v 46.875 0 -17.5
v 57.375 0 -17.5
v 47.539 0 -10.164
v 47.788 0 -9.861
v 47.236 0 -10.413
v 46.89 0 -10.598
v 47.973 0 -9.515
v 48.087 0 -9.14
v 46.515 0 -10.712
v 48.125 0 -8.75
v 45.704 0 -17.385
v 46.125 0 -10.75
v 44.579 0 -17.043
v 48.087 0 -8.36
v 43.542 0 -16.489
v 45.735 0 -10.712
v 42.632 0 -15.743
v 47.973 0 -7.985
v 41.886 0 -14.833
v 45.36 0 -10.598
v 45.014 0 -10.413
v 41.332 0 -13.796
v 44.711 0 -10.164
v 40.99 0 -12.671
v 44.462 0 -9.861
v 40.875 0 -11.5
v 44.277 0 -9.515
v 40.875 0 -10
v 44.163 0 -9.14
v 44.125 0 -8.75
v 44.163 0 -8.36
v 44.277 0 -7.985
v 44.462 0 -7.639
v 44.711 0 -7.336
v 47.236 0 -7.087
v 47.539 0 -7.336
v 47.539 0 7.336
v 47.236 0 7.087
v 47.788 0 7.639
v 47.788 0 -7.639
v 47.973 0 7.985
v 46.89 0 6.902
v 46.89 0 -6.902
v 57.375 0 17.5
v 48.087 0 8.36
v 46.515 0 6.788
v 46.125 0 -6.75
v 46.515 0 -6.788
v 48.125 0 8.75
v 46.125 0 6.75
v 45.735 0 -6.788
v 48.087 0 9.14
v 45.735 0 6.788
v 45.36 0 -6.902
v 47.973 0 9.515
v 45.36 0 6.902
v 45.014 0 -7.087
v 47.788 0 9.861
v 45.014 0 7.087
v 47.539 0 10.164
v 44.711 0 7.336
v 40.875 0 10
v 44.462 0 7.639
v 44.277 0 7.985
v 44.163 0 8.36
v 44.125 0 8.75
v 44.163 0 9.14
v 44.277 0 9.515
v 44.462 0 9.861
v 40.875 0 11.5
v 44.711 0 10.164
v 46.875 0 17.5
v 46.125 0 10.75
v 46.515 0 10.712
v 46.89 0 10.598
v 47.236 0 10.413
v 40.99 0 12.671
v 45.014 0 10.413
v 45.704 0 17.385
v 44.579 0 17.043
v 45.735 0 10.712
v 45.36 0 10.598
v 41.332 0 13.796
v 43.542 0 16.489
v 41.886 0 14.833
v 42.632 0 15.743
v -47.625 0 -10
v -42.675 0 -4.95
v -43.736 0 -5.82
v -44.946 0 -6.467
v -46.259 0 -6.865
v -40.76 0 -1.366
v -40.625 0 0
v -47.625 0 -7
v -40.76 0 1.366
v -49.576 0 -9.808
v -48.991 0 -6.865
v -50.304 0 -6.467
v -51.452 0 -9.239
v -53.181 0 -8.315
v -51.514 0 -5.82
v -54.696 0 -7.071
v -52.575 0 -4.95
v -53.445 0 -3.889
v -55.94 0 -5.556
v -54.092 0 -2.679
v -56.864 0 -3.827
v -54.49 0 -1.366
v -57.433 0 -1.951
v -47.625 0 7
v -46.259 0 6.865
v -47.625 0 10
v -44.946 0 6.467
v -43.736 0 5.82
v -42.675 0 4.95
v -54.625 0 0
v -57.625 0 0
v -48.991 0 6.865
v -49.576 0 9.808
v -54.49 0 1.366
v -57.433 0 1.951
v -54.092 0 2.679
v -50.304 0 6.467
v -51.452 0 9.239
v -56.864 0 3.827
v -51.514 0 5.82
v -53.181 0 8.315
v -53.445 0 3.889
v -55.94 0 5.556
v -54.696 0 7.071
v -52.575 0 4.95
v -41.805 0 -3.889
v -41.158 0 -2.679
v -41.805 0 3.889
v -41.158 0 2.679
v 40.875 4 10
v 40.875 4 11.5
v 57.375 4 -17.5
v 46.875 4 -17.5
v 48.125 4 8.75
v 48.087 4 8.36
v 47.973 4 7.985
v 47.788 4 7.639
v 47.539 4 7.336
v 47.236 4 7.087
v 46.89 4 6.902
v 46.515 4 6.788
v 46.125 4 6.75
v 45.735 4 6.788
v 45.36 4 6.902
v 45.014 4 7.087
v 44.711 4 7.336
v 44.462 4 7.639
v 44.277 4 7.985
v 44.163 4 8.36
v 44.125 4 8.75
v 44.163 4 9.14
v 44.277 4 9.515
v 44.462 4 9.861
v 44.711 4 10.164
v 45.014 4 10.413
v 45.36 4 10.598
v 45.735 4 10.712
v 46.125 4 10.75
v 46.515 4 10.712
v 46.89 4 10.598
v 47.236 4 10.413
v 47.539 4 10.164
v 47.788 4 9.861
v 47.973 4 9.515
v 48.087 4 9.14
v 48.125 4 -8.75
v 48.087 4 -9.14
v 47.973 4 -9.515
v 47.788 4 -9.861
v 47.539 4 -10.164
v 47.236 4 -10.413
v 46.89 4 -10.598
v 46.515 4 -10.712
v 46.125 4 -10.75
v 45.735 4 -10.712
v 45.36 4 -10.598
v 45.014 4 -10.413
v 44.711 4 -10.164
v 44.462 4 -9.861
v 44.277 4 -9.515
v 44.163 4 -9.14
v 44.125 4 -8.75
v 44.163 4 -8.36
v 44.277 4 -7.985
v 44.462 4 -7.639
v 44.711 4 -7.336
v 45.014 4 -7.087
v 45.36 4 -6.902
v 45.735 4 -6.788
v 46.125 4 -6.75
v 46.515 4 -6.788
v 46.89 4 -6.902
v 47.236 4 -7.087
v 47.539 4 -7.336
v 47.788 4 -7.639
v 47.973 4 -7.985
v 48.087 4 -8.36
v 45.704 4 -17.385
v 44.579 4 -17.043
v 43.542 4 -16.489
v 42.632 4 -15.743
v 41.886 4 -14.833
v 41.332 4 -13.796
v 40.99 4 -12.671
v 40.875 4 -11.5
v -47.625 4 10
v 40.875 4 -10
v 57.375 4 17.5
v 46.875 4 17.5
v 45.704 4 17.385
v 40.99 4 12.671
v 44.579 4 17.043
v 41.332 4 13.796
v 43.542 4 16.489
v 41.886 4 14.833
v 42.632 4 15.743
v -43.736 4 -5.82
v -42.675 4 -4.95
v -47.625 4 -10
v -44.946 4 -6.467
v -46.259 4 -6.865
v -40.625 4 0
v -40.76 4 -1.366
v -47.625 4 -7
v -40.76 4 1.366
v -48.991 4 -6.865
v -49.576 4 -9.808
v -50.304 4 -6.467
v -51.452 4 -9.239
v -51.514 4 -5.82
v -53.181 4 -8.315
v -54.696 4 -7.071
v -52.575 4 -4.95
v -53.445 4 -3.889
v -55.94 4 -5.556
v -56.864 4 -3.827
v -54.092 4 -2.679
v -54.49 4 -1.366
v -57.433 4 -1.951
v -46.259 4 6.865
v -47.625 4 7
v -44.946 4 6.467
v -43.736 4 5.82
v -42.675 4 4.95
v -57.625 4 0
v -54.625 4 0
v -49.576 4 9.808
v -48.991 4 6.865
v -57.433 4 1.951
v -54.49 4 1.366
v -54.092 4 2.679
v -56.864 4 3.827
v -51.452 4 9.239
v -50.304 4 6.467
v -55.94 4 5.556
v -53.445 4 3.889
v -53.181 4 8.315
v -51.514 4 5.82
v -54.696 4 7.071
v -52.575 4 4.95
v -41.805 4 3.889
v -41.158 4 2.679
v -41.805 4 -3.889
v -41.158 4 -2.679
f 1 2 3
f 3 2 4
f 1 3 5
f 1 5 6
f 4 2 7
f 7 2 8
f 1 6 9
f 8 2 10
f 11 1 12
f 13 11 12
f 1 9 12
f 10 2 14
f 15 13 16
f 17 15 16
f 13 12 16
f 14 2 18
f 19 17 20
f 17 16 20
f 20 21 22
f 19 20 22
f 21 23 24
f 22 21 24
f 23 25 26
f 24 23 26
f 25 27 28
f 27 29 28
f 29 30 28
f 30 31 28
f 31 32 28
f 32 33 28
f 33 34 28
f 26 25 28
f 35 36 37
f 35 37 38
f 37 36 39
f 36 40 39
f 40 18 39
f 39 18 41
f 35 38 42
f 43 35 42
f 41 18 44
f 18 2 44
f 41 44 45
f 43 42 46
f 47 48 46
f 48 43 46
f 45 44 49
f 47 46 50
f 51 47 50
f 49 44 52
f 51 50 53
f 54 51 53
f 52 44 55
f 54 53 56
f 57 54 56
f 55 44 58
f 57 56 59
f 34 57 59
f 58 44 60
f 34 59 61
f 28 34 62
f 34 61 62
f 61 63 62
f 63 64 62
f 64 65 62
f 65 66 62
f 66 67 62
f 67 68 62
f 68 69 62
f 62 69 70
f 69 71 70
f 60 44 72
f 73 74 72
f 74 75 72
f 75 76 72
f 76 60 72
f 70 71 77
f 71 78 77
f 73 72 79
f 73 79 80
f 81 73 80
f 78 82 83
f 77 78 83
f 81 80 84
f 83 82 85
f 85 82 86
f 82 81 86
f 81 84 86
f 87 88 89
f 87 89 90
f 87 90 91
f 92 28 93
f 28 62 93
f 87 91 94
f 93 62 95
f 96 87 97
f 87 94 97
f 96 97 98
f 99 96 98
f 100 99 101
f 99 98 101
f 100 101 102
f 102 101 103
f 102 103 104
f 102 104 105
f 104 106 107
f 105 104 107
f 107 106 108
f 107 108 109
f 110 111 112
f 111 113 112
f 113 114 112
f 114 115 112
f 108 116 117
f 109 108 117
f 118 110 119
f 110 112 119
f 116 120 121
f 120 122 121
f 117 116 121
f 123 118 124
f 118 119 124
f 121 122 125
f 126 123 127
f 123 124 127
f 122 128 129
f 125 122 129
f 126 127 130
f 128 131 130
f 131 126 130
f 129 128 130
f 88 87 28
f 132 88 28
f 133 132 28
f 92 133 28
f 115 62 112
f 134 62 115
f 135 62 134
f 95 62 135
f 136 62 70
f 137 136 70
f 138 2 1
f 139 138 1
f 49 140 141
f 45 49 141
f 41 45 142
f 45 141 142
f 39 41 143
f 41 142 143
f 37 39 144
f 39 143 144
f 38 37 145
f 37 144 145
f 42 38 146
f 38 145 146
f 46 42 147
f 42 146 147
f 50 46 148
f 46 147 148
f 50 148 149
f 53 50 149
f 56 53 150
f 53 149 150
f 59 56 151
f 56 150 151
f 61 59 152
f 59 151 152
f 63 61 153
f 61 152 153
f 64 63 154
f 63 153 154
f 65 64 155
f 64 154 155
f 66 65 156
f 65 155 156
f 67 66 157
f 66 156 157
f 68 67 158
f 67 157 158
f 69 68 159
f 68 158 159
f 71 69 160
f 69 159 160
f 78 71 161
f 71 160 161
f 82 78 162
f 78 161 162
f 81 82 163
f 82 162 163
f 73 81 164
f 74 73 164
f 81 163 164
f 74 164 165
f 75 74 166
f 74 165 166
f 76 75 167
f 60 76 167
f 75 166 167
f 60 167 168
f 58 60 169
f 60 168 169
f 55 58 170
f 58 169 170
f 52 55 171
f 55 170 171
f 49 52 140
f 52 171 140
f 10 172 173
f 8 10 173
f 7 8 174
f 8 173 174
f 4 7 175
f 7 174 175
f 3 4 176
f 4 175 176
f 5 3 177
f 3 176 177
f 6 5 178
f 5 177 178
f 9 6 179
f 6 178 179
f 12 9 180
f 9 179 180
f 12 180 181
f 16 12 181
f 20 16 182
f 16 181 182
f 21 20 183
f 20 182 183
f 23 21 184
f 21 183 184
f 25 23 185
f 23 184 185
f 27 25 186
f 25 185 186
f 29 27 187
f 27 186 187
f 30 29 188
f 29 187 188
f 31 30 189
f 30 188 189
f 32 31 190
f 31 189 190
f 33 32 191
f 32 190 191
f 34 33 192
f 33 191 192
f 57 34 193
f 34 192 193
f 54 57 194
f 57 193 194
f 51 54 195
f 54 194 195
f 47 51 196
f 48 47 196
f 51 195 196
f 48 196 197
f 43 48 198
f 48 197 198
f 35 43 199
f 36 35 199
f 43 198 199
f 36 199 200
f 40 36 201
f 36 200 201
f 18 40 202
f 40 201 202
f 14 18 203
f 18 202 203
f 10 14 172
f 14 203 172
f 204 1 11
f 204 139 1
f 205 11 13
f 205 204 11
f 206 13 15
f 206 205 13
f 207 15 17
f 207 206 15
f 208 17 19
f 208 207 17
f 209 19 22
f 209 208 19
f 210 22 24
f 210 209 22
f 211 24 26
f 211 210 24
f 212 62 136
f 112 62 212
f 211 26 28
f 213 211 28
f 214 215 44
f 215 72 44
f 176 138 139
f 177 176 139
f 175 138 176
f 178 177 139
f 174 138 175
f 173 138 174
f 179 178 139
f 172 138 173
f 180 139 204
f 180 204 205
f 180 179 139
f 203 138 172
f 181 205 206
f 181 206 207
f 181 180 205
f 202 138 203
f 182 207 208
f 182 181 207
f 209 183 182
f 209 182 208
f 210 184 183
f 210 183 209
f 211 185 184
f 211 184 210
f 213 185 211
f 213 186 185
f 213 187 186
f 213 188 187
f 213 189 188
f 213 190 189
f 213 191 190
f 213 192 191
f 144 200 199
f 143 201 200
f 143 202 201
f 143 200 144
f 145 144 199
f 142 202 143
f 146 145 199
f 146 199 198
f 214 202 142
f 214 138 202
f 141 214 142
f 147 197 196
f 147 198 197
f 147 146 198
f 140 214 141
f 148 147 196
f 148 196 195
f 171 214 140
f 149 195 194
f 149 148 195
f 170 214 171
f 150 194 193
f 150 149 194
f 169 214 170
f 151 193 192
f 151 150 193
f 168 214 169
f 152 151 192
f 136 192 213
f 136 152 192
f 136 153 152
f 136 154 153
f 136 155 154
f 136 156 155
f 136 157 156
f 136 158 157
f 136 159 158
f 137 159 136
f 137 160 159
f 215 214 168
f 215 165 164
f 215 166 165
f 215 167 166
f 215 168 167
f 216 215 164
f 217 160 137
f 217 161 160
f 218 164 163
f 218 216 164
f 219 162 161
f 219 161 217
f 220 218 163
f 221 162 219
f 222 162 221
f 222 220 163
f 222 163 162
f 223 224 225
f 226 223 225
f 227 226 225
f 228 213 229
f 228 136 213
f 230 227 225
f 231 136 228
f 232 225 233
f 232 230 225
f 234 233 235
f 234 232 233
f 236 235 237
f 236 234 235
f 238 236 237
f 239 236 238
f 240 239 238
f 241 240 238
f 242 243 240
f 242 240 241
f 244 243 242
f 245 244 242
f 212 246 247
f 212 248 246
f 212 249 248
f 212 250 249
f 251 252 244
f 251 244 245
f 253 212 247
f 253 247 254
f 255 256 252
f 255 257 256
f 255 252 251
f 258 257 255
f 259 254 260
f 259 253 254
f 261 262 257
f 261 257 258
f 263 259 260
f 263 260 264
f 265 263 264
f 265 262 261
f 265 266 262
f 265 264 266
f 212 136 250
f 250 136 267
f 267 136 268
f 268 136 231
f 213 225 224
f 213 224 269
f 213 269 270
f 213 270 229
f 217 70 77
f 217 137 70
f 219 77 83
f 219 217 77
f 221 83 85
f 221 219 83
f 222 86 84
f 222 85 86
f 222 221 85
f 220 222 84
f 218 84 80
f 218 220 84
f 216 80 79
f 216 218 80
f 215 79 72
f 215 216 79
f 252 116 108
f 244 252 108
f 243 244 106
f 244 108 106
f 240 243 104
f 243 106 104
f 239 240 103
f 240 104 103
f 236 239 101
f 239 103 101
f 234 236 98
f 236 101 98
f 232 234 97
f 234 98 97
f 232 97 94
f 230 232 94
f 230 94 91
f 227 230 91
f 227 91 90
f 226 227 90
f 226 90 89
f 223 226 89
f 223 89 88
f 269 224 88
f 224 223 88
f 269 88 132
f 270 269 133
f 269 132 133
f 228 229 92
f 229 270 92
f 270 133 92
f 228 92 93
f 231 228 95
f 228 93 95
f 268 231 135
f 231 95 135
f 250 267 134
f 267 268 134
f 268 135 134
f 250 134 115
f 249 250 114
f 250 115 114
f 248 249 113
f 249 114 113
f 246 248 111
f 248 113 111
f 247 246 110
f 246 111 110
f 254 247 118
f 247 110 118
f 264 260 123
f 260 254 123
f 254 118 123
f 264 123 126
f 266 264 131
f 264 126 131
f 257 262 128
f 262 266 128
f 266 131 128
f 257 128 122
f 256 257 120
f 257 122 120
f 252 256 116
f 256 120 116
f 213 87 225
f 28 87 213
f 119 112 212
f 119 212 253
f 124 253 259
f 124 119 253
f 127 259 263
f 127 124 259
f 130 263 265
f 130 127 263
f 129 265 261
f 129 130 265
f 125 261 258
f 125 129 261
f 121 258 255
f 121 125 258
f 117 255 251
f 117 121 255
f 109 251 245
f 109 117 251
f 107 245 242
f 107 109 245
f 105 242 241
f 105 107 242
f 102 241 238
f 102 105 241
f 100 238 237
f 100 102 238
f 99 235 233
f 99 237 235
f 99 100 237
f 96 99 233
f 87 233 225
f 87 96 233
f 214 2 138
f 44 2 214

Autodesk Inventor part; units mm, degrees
ref_plane "YZ Plane" through (0, 0, 0) normal (1, 0, 0) x (0, 1, 0)
ref_plane "XZ Plane" through (0, 0, 0) normal (0, 1, 0) x (-1, 0, 0)
ref_plane "XY Plane" through (0, 0, 0) normal (0, 0, 1) x (1, 0, 0)
sketch "Main Sketch" plane through (0, 0, 0) normal (0, 1, 0) x (-1, 0, 0)
  line L0 (-57.375, -12.0472) -> (-57.375, 12.0472)
  line L1 (-57.375, 12.0472) -> (47.625, -10) construction
  line L2 (47.625, 10) -> (-57.375, -12.0472) construction
  circle A0 centre (47.625, 0) radius 7
  arc A1 (47.625, -10) -> (47.625, 10) centre (47.625, 0) ccw
  line L3 (-40.875, 17.5) -> (-57.375, 17.5)
  line L4 (-57.375, 17.5) -> (-57.375, -17.5)
  line L5 (-57.375, -17.5) -> (-40.875, -17.5)
  line L6 (-40.875, 17.5) -> (-57.375, -17.5) construction
  line L7 (-57.375, 17.5) -> (-40.875, -17.5) construction
  line L8 (47.625, -10) -> (-40.875, -10)
  line L9 (-40.875, -17.5) -> (-40.875, -10)
  line L10 (-40.875, 10) -> (-40.875, 17.5)
  line L11 (-40.875, 10) -> (47.625, 10)
  point P0 (0, 0)
  point P1 (-49.125, 0)
  dimension "d3" = 14
  dimension "d4" = 105
  dimension "d13" = 16.5
  dimension "d14" = 35
  dimension "d15" = 0
  dimension "d18" = 20
extrude "Main Extrusion" add sketch "Main Sketch" along normal blind 4
sketch "Screw Holes Sketch" plane through (0, 4, 0) normal (0, 1, 0) x (1, 0, 0)
  circle A0 centre (46.125, -8.75) radius 2
  line L0 (57.375, 17.5) -> (40.875, 17.5) projected
  line L1 (40.875, -17.5) -> (57.375, -17.5) projected
  line L2 (35.2664, 0) -> (65.7891, 0)
  line L3 (51.375, -27.0398) -> (51.375, 30.2346) construction
  line L4 (57.375, -17.5) -> (57.375, 17.5) projected
  line L5 (40.875, -10) -> (40.875, -17.5) projected
  circle A1 centre (46.125, 8.75) radius 2
  line L6 (51.375, 27.0398) -> (51.375, -30.2346) construction
  point P0 (0, 0)
  dimension "d21" = 4
  dimension "d22" = 35
  dimension "d23" = 6
  dimension "d24" = 5.25
  dimension "d25" = 5.25
  dimension "d26" = 10.5
  dimension "d27" = 8.75
  dimension "d28" = 17.5
extrude "Screw Holes Cut" cut sketch "Screw Holes Sketch" against normal through all
fillet "Fillet1" radius 6 2 edges at (40.875, 2, -17.5) (40.875, 2, 17.5)
properties part number "TapeMeasureBracketSide"
